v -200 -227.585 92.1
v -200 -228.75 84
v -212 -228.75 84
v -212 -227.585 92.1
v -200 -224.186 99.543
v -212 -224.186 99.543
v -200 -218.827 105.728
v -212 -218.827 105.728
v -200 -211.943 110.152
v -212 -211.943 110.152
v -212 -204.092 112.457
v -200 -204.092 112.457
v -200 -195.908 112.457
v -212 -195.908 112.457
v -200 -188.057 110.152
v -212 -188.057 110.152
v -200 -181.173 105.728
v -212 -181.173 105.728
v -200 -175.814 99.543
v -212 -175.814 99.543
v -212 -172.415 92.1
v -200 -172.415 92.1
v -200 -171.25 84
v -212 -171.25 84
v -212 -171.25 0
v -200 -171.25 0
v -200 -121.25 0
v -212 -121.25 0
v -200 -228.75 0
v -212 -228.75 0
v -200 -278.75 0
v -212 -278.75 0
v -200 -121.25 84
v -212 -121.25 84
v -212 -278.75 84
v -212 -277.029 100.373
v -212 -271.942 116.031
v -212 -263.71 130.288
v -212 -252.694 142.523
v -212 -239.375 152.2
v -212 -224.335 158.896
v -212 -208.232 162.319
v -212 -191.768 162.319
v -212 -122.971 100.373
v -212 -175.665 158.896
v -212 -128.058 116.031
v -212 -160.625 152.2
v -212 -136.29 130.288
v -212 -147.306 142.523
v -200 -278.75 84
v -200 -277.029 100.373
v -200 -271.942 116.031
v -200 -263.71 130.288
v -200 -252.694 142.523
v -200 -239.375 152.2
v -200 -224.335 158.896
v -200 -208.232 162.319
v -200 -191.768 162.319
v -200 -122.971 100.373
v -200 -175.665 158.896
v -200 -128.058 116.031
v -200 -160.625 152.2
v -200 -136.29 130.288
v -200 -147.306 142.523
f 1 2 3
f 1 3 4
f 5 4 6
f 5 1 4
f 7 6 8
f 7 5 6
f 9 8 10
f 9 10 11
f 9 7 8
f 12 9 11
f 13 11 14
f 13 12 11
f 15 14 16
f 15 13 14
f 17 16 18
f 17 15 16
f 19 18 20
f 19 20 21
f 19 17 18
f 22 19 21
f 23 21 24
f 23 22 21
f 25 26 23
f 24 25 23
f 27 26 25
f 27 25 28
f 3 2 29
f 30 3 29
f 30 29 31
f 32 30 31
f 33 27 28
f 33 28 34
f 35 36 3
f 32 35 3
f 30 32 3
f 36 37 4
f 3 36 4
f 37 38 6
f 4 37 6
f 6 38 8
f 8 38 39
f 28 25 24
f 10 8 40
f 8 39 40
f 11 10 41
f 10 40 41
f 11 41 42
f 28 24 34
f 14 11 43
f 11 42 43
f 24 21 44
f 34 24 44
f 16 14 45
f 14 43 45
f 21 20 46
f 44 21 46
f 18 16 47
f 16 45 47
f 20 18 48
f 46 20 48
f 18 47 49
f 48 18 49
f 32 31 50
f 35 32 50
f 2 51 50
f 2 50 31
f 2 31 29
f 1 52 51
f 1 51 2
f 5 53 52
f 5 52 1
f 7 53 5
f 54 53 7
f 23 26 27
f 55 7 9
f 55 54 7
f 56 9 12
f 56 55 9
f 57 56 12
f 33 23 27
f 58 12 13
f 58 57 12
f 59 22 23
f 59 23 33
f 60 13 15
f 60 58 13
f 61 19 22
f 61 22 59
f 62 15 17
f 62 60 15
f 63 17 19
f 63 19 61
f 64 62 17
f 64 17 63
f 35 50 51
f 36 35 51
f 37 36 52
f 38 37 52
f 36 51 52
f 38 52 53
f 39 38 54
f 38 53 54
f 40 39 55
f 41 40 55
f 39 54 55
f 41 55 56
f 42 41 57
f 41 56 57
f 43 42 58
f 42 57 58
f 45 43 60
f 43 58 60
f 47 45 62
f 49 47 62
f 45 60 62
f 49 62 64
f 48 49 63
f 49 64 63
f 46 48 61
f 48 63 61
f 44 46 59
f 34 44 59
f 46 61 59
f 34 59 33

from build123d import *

# Parameters (mm, degrees)
PAD010_DEPTH = 12


with BuildPart() as support_hook:
    # Sketch023 → Pad010 (new body)
    with BuildSketch(Plane.YZ):
        with BuildLine():
            Line((-28.75, 0), (-78.75, 0))
            Line((-78.75, 0), (-78.75, 84))
            ThreePointArc((78.75, 84), (0, 162.75), (-78.75, 84))
            Line((78.75, 0), (78.75, 84))
            Line((28.75, 0), (78.75, 0))
            Line((28.75, 84), (28.75, 0))
            ThreePointArc((28.75, 84), (0, 112.75), (-28.75, 84))
            Line((-28.75, 0), (-28.75, 84))
        make_face()
    extrude(amount=PAD010_DEPTH)


with BuildPart() as support_hook_1:
    # Body011 placement: moved
    add(support_hook.part.moved(Location((200, 200, 0))))


with BuildPart() as part_mirroring007:
    # Part__Mirroring007: instance of support_hook
    add(support_hook_1.part.mirror(Plane(origin=(0, 0, 0), x_dir=(1, 0, 0), z_dir=(0, 1, 0))))


with BuildPart() as part_mirroring008:
    # Part__Mirroring008: instance of Part__Mirroring007
    add(part_mirroring007.part.mirror(Plane(origin=(0, 0, 0), x_dir=(0, -1, 0), z_dir=(1, 0, 0))))


solid = part_mirroring008.part
